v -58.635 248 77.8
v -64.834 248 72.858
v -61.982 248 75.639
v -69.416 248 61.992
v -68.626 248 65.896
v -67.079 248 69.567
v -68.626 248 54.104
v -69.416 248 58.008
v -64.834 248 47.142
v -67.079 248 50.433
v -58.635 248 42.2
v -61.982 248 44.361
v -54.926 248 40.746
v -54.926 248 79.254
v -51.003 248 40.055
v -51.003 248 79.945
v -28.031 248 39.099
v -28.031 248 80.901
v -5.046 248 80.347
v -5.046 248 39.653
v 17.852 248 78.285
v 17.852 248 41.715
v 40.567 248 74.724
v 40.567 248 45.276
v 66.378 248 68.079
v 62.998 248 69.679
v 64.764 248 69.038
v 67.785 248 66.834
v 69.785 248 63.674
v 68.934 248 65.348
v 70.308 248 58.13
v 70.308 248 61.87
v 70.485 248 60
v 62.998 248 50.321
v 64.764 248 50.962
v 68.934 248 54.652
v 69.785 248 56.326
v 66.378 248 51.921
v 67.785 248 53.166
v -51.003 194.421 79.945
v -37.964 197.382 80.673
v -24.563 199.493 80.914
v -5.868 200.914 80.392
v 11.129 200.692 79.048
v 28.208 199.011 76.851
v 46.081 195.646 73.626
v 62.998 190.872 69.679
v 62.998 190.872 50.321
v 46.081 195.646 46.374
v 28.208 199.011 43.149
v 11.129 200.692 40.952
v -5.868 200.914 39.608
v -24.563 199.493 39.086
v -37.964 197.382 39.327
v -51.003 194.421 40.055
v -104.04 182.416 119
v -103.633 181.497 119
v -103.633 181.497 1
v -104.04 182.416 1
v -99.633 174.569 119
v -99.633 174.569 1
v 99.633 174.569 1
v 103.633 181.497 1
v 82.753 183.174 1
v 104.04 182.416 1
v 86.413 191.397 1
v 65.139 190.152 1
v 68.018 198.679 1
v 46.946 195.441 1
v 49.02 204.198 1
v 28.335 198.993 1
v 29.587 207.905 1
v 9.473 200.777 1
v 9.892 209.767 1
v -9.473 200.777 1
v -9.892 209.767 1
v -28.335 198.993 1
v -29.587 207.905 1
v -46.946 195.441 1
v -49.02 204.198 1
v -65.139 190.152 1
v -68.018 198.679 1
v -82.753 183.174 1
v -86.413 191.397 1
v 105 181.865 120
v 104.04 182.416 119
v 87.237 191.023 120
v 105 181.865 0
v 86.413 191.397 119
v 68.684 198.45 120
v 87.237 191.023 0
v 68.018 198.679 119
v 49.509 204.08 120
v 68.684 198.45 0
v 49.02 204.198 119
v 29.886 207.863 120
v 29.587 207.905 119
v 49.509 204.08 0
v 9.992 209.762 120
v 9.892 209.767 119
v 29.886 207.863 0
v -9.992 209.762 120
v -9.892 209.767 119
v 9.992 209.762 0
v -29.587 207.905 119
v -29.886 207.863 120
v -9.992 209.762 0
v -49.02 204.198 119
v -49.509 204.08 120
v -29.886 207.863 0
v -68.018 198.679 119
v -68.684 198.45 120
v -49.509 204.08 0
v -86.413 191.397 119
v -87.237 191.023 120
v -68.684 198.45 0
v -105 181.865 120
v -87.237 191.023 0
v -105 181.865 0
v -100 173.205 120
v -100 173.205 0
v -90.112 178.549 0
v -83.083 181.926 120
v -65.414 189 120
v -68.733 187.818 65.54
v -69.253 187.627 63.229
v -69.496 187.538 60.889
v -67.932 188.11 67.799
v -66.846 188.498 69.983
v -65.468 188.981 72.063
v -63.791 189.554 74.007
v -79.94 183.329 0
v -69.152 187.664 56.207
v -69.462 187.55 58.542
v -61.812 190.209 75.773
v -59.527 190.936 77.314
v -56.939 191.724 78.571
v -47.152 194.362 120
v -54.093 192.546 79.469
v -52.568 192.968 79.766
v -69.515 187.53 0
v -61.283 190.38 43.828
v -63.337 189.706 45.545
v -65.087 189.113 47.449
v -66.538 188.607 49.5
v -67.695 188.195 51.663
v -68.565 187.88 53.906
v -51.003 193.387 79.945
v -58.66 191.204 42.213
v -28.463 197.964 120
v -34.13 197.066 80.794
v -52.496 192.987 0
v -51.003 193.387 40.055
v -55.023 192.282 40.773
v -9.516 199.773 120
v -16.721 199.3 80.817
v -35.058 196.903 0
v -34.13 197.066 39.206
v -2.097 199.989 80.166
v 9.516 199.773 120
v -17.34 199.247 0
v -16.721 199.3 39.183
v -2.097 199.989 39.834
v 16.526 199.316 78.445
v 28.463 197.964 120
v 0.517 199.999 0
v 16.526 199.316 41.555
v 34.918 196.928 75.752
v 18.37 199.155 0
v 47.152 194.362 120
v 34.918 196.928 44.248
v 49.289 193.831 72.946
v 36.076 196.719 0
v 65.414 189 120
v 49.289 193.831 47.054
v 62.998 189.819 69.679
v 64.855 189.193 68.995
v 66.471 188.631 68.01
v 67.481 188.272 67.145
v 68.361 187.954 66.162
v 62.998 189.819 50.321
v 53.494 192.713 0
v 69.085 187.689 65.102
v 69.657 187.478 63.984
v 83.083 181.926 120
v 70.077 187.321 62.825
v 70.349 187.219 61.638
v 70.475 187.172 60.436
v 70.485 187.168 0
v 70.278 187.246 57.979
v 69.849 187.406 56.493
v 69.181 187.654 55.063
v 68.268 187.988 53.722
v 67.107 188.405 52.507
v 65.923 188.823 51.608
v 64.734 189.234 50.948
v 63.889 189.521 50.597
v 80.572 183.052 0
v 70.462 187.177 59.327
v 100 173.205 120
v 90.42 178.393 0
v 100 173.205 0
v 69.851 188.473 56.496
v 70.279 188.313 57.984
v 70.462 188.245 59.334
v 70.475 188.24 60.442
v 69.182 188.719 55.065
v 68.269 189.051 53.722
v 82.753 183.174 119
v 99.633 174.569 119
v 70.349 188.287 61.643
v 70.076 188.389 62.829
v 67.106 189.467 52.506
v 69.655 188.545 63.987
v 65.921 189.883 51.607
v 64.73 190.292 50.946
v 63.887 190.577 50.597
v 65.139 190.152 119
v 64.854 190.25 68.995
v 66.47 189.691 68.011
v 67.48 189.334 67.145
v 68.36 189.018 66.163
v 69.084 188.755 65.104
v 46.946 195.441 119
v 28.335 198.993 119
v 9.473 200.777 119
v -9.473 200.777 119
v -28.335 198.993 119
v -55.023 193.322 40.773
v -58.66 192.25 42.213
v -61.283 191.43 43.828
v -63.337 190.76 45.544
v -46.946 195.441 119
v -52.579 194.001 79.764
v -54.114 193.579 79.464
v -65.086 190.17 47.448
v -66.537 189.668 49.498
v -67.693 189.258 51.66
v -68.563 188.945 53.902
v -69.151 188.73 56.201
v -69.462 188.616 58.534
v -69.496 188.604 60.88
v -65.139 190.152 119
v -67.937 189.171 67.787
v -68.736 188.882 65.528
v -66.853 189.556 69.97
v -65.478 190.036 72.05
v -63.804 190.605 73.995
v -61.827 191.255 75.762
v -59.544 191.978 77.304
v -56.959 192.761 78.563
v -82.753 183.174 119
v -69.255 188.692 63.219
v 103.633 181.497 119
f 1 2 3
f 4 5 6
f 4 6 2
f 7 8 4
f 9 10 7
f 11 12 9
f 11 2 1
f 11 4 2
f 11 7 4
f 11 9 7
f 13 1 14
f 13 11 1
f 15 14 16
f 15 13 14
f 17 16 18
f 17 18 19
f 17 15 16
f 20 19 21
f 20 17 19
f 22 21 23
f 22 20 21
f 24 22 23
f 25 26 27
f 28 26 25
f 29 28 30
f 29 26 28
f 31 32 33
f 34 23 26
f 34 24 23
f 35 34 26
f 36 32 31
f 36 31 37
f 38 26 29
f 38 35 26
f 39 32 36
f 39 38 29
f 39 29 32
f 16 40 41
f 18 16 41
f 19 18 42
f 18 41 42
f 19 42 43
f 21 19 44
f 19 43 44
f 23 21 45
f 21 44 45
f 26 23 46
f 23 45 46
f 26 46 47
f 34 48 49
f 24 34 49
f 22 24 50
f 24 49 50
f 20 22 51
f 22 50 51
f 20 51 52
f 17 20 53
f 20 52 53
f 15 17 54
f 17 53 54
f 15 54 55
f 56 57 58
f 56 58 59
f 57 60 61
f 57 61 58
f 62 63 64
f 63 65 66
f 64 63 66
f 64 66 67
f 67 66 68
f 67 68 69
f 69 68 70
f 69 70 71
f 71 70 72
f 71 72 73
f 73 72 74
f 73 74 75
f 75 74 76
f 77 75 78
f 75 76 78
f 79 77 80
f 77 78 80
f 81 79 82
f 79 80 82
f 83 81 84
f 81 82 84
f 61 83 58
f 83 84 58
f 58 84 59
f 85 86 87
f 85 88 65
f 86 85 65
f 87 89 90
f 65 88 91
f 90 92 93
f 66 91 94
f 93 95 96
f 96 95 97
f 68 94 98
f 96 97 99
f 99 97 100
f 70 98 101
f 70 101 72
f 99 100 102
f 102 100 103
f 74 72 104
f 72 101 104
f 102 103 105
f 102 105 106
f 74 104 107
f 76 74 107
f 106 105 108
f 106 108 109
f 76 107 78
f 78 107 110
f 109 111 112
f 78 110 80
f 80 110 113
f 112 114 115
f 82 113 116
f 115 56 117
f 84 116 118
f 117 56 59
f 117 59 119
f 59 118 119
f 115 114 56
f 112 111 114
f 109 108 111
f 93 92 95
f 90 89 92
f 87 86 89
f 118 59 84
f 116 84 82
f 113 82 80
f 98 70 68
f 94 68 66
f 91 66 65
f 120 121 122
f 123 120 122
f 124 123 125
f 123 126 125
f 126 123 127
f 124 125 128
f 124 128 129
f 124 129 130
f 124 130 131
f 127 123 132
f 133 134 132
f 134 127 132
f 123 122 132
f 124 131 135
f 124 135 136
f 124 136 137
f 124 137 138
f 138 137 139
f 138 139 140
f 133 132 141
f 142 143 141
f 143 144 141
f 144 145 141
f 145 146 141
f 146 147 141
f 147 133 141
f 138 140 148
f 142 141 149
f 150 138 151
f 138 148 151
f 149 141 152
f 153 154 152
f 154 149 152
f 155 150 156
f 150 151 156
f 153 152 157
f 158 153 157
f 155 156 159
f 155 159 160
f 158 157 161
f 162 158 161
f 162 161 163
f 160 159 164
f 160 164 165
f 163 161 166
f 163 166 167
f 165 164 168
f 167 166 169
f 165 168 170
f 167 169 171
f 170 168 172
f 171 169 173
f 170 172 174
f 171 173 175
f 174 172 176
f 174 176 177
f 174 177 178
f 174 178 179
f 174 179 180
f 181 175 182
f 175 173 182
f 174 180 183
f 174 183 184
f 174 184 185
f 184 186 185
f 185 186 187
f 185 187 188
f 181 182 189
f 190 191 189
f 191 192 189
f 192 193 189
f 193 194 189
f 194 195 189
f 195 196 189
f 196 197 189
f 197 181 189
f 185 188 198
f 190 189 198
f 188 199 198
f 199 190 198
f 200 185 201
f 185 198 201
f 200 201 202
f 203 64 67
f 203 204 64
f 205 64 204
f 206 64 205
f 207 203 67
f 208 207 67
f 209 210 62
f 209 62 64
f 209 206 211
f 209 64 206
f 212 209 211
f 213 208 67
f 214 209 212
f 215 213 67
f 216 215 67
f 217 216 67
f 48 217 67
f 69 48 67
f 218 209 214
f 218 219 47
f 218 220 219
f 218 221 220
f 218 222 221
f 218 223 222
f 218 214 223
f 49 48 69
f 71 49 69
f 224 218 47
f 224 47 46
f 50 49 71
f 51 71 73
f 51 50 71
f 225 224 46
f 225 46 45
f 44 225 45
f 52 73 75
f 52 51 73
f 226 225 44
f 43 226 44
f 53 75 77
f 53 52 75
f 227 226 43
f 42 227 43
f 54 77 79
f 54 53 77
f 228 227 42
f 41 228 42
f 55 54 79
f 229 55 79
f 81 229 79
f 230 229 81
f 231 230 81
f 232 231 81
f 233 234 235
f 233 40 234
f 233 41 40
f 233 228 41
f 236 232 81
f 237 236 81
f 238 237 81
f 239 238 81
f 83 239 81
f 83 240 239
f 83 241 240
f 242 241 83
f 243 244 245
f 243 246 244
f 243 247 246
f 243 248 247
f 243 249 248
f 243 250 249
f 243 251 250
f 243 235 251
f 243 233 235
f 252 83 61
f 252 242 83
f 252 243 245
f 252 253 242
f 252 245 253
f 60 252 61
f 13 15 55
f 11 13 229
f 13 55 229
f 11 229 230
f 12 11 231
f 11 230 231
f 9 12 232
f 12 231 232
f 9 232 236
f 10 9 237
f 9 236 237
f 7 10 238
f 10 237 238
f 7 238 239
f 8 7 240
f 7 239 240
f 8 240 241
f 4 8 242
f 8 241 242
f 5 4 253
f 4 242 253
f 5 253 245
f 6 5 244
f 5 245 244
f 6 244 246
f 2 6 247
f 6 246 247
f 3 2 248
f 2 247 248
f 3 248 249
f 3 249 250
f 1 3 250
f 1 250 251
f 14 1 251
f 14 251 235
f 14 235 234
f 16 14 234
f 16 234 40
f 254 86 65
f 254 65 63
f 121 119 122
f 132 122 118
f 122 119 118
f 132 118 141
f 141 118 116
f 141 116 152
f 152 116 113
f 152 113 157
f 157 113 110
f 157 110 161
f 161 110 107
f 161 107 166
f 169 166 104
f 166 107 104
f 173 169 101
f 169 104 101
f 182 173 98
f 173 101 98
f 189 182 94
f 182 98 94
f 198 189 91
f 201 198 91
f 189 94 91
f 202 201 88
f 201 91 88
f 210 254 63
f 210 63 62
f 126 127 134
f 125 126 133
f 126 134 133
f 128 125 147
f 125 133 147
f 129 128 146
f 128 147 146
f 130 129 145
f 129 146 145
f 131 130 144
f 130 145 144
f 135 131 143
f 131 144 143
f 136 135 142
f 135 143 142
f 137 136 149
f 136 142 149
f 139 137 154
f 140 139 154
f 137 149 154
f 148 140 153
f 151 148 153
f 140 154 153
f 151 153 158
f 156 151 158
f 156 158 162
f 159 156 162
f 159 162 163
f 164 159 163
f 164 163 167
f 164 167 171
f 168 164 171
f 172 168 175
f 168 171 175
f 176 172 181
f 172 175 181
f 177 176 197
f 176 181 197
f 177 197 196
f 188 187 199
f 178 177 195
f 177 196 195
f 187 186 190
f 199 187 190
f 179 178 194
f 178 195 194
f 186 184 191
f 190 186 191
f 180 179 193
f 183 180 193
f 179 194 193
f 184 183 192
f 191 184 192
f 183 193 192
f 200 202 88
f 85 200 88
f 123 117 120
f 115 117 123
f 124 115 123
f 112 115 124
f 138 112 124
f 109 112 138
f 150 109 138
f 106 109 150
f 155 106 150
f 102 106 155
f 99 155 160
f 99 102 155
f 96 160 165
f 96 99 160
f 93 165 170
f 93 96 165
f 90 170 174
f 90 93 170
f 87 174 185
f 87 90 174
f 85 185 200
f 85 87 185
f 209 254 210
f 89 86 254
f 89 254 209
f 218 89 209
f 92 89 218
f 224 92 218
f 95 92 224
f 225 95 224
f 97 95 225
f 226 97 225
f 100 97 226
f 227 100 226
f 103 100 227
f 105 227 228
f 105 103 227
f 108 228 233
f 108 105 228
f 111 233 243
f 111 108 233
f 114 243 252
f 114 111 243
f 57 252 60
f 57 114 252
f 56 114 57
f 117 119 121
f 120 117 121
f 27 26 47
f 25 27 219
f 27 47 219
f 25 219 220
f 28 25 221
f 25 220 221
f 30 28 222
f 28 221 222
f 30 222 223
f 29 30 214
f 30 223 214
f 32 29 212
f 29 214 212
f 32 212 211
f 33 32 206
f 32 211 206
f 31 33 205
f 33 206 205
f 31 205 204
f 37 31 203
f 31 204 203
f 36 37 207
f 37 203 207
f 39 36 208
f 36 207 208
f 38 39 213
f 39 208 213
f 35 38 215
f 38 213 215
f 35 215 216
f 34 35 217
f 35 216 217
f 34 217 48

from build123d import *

# Parameters (mm, degrees)
BOSS_EXTRUDE1_DEPTH = 120
CUT_EXTRUDE1_DEPTH  = 118
BOSS_EXTRUDE2_DEPTH = 248
CUT_EXTRUDE2_DEPTH  = 269


with BuildPart() as part:
    # Sketch1 → Boss-Extrude1 (new body)
    with BuildSketch(Plane.XY):
        with BuildLine():
            Line((-105, 181.865334795), (-100, 173.205080757))
            ThreePointArc((-100, 173.205080757), (0, 200), (100, 173.205080757))
            Line((100, 173.205080757), (105, 181.865334795))
            ThreePointArc((105, 181.865334795), (0, 210), (-105, 181.865334795))
        make_face()
    extrude(amount=BOSS_EXTRUDE1_DEPTH)

    # Sketch2 → Cut-Extrude1 (cut)
    with BuildSketch(Plane.XY.offset(119)):
        with BuildLine():
            ThreePointArc((99.632730807, 174.568951855), (0, 201), (-99.632730807, 174.568951855))
            Line((-99.632730807, 174.568951855), (-103.632778417, 181.497237548))
            Line((-103.632778417, 181.497237548), (-105, 184.581371686))
            Line((-105, 184.581371686), (38.612235753, 274.588582832))
            Line((38.612235753, 274.588582832), (105, 184.581371686))
            Line((105, 184.581371686), (103.632778417, 181.497237548))
            Line((103.632778417, 181.497237548), (99.632730807, 174.568951855))
        make_face()
    extrude(amount=-CUT_EXTRUDE1_DEPTH, mode=Mode.SUBTRACT)

    # Sketch3 → Boss-Extrude2 (add)
    with BuildSketch(Plane(origin=(0, 0, 0), x_dir=(1, 0, 0), z_dir=(0, 1, 0))):
        with BuildLine():
            ThreePointArc((-51.003018744, -40.055400821), (-69.515415438, -60), (-51.003018744, -79.944599179))
            ThreePointArc((-51.003018744, -79.944599179), (6.419962074, -79.503661207), (62.997953546, -69.67899666))
            ThreePointArc((62.997953546, -69.67899666), (70.484584562, -60), (62.997953546, -50.32100334))
            ThreePointArc((62.997953546, -50.32100334), (6.419962074, -40.496338793), (-51.003018744, -40.055400821))
        make_face()
    extrude(amount=BOSS_EXTRUDE2_DEPTH)

    # Sketch4 → Cut-Extrude2 (cut)
    with BuildSketch(Plane.XY):
        with BuildLine():
            Line((70.484584562, 187.168168606), (163.146781593, -79.750206807))
            Line((163.146781593, -79.750206807), (-229.131099013, -106.991726293))
            Line((-229.131099013, -106.991726293), (-69.515415438, 187.530282932))
            ThreePointArc((-69.515415438, 187.530282932), (0.51730445, 199.999330989), (70.484584562, 187.168168606))
        make_face()
    extrude(amount=CUT_EXTRUDE2_DEPTH, mode=Mode.SUBTRACT)


solid = part.part
